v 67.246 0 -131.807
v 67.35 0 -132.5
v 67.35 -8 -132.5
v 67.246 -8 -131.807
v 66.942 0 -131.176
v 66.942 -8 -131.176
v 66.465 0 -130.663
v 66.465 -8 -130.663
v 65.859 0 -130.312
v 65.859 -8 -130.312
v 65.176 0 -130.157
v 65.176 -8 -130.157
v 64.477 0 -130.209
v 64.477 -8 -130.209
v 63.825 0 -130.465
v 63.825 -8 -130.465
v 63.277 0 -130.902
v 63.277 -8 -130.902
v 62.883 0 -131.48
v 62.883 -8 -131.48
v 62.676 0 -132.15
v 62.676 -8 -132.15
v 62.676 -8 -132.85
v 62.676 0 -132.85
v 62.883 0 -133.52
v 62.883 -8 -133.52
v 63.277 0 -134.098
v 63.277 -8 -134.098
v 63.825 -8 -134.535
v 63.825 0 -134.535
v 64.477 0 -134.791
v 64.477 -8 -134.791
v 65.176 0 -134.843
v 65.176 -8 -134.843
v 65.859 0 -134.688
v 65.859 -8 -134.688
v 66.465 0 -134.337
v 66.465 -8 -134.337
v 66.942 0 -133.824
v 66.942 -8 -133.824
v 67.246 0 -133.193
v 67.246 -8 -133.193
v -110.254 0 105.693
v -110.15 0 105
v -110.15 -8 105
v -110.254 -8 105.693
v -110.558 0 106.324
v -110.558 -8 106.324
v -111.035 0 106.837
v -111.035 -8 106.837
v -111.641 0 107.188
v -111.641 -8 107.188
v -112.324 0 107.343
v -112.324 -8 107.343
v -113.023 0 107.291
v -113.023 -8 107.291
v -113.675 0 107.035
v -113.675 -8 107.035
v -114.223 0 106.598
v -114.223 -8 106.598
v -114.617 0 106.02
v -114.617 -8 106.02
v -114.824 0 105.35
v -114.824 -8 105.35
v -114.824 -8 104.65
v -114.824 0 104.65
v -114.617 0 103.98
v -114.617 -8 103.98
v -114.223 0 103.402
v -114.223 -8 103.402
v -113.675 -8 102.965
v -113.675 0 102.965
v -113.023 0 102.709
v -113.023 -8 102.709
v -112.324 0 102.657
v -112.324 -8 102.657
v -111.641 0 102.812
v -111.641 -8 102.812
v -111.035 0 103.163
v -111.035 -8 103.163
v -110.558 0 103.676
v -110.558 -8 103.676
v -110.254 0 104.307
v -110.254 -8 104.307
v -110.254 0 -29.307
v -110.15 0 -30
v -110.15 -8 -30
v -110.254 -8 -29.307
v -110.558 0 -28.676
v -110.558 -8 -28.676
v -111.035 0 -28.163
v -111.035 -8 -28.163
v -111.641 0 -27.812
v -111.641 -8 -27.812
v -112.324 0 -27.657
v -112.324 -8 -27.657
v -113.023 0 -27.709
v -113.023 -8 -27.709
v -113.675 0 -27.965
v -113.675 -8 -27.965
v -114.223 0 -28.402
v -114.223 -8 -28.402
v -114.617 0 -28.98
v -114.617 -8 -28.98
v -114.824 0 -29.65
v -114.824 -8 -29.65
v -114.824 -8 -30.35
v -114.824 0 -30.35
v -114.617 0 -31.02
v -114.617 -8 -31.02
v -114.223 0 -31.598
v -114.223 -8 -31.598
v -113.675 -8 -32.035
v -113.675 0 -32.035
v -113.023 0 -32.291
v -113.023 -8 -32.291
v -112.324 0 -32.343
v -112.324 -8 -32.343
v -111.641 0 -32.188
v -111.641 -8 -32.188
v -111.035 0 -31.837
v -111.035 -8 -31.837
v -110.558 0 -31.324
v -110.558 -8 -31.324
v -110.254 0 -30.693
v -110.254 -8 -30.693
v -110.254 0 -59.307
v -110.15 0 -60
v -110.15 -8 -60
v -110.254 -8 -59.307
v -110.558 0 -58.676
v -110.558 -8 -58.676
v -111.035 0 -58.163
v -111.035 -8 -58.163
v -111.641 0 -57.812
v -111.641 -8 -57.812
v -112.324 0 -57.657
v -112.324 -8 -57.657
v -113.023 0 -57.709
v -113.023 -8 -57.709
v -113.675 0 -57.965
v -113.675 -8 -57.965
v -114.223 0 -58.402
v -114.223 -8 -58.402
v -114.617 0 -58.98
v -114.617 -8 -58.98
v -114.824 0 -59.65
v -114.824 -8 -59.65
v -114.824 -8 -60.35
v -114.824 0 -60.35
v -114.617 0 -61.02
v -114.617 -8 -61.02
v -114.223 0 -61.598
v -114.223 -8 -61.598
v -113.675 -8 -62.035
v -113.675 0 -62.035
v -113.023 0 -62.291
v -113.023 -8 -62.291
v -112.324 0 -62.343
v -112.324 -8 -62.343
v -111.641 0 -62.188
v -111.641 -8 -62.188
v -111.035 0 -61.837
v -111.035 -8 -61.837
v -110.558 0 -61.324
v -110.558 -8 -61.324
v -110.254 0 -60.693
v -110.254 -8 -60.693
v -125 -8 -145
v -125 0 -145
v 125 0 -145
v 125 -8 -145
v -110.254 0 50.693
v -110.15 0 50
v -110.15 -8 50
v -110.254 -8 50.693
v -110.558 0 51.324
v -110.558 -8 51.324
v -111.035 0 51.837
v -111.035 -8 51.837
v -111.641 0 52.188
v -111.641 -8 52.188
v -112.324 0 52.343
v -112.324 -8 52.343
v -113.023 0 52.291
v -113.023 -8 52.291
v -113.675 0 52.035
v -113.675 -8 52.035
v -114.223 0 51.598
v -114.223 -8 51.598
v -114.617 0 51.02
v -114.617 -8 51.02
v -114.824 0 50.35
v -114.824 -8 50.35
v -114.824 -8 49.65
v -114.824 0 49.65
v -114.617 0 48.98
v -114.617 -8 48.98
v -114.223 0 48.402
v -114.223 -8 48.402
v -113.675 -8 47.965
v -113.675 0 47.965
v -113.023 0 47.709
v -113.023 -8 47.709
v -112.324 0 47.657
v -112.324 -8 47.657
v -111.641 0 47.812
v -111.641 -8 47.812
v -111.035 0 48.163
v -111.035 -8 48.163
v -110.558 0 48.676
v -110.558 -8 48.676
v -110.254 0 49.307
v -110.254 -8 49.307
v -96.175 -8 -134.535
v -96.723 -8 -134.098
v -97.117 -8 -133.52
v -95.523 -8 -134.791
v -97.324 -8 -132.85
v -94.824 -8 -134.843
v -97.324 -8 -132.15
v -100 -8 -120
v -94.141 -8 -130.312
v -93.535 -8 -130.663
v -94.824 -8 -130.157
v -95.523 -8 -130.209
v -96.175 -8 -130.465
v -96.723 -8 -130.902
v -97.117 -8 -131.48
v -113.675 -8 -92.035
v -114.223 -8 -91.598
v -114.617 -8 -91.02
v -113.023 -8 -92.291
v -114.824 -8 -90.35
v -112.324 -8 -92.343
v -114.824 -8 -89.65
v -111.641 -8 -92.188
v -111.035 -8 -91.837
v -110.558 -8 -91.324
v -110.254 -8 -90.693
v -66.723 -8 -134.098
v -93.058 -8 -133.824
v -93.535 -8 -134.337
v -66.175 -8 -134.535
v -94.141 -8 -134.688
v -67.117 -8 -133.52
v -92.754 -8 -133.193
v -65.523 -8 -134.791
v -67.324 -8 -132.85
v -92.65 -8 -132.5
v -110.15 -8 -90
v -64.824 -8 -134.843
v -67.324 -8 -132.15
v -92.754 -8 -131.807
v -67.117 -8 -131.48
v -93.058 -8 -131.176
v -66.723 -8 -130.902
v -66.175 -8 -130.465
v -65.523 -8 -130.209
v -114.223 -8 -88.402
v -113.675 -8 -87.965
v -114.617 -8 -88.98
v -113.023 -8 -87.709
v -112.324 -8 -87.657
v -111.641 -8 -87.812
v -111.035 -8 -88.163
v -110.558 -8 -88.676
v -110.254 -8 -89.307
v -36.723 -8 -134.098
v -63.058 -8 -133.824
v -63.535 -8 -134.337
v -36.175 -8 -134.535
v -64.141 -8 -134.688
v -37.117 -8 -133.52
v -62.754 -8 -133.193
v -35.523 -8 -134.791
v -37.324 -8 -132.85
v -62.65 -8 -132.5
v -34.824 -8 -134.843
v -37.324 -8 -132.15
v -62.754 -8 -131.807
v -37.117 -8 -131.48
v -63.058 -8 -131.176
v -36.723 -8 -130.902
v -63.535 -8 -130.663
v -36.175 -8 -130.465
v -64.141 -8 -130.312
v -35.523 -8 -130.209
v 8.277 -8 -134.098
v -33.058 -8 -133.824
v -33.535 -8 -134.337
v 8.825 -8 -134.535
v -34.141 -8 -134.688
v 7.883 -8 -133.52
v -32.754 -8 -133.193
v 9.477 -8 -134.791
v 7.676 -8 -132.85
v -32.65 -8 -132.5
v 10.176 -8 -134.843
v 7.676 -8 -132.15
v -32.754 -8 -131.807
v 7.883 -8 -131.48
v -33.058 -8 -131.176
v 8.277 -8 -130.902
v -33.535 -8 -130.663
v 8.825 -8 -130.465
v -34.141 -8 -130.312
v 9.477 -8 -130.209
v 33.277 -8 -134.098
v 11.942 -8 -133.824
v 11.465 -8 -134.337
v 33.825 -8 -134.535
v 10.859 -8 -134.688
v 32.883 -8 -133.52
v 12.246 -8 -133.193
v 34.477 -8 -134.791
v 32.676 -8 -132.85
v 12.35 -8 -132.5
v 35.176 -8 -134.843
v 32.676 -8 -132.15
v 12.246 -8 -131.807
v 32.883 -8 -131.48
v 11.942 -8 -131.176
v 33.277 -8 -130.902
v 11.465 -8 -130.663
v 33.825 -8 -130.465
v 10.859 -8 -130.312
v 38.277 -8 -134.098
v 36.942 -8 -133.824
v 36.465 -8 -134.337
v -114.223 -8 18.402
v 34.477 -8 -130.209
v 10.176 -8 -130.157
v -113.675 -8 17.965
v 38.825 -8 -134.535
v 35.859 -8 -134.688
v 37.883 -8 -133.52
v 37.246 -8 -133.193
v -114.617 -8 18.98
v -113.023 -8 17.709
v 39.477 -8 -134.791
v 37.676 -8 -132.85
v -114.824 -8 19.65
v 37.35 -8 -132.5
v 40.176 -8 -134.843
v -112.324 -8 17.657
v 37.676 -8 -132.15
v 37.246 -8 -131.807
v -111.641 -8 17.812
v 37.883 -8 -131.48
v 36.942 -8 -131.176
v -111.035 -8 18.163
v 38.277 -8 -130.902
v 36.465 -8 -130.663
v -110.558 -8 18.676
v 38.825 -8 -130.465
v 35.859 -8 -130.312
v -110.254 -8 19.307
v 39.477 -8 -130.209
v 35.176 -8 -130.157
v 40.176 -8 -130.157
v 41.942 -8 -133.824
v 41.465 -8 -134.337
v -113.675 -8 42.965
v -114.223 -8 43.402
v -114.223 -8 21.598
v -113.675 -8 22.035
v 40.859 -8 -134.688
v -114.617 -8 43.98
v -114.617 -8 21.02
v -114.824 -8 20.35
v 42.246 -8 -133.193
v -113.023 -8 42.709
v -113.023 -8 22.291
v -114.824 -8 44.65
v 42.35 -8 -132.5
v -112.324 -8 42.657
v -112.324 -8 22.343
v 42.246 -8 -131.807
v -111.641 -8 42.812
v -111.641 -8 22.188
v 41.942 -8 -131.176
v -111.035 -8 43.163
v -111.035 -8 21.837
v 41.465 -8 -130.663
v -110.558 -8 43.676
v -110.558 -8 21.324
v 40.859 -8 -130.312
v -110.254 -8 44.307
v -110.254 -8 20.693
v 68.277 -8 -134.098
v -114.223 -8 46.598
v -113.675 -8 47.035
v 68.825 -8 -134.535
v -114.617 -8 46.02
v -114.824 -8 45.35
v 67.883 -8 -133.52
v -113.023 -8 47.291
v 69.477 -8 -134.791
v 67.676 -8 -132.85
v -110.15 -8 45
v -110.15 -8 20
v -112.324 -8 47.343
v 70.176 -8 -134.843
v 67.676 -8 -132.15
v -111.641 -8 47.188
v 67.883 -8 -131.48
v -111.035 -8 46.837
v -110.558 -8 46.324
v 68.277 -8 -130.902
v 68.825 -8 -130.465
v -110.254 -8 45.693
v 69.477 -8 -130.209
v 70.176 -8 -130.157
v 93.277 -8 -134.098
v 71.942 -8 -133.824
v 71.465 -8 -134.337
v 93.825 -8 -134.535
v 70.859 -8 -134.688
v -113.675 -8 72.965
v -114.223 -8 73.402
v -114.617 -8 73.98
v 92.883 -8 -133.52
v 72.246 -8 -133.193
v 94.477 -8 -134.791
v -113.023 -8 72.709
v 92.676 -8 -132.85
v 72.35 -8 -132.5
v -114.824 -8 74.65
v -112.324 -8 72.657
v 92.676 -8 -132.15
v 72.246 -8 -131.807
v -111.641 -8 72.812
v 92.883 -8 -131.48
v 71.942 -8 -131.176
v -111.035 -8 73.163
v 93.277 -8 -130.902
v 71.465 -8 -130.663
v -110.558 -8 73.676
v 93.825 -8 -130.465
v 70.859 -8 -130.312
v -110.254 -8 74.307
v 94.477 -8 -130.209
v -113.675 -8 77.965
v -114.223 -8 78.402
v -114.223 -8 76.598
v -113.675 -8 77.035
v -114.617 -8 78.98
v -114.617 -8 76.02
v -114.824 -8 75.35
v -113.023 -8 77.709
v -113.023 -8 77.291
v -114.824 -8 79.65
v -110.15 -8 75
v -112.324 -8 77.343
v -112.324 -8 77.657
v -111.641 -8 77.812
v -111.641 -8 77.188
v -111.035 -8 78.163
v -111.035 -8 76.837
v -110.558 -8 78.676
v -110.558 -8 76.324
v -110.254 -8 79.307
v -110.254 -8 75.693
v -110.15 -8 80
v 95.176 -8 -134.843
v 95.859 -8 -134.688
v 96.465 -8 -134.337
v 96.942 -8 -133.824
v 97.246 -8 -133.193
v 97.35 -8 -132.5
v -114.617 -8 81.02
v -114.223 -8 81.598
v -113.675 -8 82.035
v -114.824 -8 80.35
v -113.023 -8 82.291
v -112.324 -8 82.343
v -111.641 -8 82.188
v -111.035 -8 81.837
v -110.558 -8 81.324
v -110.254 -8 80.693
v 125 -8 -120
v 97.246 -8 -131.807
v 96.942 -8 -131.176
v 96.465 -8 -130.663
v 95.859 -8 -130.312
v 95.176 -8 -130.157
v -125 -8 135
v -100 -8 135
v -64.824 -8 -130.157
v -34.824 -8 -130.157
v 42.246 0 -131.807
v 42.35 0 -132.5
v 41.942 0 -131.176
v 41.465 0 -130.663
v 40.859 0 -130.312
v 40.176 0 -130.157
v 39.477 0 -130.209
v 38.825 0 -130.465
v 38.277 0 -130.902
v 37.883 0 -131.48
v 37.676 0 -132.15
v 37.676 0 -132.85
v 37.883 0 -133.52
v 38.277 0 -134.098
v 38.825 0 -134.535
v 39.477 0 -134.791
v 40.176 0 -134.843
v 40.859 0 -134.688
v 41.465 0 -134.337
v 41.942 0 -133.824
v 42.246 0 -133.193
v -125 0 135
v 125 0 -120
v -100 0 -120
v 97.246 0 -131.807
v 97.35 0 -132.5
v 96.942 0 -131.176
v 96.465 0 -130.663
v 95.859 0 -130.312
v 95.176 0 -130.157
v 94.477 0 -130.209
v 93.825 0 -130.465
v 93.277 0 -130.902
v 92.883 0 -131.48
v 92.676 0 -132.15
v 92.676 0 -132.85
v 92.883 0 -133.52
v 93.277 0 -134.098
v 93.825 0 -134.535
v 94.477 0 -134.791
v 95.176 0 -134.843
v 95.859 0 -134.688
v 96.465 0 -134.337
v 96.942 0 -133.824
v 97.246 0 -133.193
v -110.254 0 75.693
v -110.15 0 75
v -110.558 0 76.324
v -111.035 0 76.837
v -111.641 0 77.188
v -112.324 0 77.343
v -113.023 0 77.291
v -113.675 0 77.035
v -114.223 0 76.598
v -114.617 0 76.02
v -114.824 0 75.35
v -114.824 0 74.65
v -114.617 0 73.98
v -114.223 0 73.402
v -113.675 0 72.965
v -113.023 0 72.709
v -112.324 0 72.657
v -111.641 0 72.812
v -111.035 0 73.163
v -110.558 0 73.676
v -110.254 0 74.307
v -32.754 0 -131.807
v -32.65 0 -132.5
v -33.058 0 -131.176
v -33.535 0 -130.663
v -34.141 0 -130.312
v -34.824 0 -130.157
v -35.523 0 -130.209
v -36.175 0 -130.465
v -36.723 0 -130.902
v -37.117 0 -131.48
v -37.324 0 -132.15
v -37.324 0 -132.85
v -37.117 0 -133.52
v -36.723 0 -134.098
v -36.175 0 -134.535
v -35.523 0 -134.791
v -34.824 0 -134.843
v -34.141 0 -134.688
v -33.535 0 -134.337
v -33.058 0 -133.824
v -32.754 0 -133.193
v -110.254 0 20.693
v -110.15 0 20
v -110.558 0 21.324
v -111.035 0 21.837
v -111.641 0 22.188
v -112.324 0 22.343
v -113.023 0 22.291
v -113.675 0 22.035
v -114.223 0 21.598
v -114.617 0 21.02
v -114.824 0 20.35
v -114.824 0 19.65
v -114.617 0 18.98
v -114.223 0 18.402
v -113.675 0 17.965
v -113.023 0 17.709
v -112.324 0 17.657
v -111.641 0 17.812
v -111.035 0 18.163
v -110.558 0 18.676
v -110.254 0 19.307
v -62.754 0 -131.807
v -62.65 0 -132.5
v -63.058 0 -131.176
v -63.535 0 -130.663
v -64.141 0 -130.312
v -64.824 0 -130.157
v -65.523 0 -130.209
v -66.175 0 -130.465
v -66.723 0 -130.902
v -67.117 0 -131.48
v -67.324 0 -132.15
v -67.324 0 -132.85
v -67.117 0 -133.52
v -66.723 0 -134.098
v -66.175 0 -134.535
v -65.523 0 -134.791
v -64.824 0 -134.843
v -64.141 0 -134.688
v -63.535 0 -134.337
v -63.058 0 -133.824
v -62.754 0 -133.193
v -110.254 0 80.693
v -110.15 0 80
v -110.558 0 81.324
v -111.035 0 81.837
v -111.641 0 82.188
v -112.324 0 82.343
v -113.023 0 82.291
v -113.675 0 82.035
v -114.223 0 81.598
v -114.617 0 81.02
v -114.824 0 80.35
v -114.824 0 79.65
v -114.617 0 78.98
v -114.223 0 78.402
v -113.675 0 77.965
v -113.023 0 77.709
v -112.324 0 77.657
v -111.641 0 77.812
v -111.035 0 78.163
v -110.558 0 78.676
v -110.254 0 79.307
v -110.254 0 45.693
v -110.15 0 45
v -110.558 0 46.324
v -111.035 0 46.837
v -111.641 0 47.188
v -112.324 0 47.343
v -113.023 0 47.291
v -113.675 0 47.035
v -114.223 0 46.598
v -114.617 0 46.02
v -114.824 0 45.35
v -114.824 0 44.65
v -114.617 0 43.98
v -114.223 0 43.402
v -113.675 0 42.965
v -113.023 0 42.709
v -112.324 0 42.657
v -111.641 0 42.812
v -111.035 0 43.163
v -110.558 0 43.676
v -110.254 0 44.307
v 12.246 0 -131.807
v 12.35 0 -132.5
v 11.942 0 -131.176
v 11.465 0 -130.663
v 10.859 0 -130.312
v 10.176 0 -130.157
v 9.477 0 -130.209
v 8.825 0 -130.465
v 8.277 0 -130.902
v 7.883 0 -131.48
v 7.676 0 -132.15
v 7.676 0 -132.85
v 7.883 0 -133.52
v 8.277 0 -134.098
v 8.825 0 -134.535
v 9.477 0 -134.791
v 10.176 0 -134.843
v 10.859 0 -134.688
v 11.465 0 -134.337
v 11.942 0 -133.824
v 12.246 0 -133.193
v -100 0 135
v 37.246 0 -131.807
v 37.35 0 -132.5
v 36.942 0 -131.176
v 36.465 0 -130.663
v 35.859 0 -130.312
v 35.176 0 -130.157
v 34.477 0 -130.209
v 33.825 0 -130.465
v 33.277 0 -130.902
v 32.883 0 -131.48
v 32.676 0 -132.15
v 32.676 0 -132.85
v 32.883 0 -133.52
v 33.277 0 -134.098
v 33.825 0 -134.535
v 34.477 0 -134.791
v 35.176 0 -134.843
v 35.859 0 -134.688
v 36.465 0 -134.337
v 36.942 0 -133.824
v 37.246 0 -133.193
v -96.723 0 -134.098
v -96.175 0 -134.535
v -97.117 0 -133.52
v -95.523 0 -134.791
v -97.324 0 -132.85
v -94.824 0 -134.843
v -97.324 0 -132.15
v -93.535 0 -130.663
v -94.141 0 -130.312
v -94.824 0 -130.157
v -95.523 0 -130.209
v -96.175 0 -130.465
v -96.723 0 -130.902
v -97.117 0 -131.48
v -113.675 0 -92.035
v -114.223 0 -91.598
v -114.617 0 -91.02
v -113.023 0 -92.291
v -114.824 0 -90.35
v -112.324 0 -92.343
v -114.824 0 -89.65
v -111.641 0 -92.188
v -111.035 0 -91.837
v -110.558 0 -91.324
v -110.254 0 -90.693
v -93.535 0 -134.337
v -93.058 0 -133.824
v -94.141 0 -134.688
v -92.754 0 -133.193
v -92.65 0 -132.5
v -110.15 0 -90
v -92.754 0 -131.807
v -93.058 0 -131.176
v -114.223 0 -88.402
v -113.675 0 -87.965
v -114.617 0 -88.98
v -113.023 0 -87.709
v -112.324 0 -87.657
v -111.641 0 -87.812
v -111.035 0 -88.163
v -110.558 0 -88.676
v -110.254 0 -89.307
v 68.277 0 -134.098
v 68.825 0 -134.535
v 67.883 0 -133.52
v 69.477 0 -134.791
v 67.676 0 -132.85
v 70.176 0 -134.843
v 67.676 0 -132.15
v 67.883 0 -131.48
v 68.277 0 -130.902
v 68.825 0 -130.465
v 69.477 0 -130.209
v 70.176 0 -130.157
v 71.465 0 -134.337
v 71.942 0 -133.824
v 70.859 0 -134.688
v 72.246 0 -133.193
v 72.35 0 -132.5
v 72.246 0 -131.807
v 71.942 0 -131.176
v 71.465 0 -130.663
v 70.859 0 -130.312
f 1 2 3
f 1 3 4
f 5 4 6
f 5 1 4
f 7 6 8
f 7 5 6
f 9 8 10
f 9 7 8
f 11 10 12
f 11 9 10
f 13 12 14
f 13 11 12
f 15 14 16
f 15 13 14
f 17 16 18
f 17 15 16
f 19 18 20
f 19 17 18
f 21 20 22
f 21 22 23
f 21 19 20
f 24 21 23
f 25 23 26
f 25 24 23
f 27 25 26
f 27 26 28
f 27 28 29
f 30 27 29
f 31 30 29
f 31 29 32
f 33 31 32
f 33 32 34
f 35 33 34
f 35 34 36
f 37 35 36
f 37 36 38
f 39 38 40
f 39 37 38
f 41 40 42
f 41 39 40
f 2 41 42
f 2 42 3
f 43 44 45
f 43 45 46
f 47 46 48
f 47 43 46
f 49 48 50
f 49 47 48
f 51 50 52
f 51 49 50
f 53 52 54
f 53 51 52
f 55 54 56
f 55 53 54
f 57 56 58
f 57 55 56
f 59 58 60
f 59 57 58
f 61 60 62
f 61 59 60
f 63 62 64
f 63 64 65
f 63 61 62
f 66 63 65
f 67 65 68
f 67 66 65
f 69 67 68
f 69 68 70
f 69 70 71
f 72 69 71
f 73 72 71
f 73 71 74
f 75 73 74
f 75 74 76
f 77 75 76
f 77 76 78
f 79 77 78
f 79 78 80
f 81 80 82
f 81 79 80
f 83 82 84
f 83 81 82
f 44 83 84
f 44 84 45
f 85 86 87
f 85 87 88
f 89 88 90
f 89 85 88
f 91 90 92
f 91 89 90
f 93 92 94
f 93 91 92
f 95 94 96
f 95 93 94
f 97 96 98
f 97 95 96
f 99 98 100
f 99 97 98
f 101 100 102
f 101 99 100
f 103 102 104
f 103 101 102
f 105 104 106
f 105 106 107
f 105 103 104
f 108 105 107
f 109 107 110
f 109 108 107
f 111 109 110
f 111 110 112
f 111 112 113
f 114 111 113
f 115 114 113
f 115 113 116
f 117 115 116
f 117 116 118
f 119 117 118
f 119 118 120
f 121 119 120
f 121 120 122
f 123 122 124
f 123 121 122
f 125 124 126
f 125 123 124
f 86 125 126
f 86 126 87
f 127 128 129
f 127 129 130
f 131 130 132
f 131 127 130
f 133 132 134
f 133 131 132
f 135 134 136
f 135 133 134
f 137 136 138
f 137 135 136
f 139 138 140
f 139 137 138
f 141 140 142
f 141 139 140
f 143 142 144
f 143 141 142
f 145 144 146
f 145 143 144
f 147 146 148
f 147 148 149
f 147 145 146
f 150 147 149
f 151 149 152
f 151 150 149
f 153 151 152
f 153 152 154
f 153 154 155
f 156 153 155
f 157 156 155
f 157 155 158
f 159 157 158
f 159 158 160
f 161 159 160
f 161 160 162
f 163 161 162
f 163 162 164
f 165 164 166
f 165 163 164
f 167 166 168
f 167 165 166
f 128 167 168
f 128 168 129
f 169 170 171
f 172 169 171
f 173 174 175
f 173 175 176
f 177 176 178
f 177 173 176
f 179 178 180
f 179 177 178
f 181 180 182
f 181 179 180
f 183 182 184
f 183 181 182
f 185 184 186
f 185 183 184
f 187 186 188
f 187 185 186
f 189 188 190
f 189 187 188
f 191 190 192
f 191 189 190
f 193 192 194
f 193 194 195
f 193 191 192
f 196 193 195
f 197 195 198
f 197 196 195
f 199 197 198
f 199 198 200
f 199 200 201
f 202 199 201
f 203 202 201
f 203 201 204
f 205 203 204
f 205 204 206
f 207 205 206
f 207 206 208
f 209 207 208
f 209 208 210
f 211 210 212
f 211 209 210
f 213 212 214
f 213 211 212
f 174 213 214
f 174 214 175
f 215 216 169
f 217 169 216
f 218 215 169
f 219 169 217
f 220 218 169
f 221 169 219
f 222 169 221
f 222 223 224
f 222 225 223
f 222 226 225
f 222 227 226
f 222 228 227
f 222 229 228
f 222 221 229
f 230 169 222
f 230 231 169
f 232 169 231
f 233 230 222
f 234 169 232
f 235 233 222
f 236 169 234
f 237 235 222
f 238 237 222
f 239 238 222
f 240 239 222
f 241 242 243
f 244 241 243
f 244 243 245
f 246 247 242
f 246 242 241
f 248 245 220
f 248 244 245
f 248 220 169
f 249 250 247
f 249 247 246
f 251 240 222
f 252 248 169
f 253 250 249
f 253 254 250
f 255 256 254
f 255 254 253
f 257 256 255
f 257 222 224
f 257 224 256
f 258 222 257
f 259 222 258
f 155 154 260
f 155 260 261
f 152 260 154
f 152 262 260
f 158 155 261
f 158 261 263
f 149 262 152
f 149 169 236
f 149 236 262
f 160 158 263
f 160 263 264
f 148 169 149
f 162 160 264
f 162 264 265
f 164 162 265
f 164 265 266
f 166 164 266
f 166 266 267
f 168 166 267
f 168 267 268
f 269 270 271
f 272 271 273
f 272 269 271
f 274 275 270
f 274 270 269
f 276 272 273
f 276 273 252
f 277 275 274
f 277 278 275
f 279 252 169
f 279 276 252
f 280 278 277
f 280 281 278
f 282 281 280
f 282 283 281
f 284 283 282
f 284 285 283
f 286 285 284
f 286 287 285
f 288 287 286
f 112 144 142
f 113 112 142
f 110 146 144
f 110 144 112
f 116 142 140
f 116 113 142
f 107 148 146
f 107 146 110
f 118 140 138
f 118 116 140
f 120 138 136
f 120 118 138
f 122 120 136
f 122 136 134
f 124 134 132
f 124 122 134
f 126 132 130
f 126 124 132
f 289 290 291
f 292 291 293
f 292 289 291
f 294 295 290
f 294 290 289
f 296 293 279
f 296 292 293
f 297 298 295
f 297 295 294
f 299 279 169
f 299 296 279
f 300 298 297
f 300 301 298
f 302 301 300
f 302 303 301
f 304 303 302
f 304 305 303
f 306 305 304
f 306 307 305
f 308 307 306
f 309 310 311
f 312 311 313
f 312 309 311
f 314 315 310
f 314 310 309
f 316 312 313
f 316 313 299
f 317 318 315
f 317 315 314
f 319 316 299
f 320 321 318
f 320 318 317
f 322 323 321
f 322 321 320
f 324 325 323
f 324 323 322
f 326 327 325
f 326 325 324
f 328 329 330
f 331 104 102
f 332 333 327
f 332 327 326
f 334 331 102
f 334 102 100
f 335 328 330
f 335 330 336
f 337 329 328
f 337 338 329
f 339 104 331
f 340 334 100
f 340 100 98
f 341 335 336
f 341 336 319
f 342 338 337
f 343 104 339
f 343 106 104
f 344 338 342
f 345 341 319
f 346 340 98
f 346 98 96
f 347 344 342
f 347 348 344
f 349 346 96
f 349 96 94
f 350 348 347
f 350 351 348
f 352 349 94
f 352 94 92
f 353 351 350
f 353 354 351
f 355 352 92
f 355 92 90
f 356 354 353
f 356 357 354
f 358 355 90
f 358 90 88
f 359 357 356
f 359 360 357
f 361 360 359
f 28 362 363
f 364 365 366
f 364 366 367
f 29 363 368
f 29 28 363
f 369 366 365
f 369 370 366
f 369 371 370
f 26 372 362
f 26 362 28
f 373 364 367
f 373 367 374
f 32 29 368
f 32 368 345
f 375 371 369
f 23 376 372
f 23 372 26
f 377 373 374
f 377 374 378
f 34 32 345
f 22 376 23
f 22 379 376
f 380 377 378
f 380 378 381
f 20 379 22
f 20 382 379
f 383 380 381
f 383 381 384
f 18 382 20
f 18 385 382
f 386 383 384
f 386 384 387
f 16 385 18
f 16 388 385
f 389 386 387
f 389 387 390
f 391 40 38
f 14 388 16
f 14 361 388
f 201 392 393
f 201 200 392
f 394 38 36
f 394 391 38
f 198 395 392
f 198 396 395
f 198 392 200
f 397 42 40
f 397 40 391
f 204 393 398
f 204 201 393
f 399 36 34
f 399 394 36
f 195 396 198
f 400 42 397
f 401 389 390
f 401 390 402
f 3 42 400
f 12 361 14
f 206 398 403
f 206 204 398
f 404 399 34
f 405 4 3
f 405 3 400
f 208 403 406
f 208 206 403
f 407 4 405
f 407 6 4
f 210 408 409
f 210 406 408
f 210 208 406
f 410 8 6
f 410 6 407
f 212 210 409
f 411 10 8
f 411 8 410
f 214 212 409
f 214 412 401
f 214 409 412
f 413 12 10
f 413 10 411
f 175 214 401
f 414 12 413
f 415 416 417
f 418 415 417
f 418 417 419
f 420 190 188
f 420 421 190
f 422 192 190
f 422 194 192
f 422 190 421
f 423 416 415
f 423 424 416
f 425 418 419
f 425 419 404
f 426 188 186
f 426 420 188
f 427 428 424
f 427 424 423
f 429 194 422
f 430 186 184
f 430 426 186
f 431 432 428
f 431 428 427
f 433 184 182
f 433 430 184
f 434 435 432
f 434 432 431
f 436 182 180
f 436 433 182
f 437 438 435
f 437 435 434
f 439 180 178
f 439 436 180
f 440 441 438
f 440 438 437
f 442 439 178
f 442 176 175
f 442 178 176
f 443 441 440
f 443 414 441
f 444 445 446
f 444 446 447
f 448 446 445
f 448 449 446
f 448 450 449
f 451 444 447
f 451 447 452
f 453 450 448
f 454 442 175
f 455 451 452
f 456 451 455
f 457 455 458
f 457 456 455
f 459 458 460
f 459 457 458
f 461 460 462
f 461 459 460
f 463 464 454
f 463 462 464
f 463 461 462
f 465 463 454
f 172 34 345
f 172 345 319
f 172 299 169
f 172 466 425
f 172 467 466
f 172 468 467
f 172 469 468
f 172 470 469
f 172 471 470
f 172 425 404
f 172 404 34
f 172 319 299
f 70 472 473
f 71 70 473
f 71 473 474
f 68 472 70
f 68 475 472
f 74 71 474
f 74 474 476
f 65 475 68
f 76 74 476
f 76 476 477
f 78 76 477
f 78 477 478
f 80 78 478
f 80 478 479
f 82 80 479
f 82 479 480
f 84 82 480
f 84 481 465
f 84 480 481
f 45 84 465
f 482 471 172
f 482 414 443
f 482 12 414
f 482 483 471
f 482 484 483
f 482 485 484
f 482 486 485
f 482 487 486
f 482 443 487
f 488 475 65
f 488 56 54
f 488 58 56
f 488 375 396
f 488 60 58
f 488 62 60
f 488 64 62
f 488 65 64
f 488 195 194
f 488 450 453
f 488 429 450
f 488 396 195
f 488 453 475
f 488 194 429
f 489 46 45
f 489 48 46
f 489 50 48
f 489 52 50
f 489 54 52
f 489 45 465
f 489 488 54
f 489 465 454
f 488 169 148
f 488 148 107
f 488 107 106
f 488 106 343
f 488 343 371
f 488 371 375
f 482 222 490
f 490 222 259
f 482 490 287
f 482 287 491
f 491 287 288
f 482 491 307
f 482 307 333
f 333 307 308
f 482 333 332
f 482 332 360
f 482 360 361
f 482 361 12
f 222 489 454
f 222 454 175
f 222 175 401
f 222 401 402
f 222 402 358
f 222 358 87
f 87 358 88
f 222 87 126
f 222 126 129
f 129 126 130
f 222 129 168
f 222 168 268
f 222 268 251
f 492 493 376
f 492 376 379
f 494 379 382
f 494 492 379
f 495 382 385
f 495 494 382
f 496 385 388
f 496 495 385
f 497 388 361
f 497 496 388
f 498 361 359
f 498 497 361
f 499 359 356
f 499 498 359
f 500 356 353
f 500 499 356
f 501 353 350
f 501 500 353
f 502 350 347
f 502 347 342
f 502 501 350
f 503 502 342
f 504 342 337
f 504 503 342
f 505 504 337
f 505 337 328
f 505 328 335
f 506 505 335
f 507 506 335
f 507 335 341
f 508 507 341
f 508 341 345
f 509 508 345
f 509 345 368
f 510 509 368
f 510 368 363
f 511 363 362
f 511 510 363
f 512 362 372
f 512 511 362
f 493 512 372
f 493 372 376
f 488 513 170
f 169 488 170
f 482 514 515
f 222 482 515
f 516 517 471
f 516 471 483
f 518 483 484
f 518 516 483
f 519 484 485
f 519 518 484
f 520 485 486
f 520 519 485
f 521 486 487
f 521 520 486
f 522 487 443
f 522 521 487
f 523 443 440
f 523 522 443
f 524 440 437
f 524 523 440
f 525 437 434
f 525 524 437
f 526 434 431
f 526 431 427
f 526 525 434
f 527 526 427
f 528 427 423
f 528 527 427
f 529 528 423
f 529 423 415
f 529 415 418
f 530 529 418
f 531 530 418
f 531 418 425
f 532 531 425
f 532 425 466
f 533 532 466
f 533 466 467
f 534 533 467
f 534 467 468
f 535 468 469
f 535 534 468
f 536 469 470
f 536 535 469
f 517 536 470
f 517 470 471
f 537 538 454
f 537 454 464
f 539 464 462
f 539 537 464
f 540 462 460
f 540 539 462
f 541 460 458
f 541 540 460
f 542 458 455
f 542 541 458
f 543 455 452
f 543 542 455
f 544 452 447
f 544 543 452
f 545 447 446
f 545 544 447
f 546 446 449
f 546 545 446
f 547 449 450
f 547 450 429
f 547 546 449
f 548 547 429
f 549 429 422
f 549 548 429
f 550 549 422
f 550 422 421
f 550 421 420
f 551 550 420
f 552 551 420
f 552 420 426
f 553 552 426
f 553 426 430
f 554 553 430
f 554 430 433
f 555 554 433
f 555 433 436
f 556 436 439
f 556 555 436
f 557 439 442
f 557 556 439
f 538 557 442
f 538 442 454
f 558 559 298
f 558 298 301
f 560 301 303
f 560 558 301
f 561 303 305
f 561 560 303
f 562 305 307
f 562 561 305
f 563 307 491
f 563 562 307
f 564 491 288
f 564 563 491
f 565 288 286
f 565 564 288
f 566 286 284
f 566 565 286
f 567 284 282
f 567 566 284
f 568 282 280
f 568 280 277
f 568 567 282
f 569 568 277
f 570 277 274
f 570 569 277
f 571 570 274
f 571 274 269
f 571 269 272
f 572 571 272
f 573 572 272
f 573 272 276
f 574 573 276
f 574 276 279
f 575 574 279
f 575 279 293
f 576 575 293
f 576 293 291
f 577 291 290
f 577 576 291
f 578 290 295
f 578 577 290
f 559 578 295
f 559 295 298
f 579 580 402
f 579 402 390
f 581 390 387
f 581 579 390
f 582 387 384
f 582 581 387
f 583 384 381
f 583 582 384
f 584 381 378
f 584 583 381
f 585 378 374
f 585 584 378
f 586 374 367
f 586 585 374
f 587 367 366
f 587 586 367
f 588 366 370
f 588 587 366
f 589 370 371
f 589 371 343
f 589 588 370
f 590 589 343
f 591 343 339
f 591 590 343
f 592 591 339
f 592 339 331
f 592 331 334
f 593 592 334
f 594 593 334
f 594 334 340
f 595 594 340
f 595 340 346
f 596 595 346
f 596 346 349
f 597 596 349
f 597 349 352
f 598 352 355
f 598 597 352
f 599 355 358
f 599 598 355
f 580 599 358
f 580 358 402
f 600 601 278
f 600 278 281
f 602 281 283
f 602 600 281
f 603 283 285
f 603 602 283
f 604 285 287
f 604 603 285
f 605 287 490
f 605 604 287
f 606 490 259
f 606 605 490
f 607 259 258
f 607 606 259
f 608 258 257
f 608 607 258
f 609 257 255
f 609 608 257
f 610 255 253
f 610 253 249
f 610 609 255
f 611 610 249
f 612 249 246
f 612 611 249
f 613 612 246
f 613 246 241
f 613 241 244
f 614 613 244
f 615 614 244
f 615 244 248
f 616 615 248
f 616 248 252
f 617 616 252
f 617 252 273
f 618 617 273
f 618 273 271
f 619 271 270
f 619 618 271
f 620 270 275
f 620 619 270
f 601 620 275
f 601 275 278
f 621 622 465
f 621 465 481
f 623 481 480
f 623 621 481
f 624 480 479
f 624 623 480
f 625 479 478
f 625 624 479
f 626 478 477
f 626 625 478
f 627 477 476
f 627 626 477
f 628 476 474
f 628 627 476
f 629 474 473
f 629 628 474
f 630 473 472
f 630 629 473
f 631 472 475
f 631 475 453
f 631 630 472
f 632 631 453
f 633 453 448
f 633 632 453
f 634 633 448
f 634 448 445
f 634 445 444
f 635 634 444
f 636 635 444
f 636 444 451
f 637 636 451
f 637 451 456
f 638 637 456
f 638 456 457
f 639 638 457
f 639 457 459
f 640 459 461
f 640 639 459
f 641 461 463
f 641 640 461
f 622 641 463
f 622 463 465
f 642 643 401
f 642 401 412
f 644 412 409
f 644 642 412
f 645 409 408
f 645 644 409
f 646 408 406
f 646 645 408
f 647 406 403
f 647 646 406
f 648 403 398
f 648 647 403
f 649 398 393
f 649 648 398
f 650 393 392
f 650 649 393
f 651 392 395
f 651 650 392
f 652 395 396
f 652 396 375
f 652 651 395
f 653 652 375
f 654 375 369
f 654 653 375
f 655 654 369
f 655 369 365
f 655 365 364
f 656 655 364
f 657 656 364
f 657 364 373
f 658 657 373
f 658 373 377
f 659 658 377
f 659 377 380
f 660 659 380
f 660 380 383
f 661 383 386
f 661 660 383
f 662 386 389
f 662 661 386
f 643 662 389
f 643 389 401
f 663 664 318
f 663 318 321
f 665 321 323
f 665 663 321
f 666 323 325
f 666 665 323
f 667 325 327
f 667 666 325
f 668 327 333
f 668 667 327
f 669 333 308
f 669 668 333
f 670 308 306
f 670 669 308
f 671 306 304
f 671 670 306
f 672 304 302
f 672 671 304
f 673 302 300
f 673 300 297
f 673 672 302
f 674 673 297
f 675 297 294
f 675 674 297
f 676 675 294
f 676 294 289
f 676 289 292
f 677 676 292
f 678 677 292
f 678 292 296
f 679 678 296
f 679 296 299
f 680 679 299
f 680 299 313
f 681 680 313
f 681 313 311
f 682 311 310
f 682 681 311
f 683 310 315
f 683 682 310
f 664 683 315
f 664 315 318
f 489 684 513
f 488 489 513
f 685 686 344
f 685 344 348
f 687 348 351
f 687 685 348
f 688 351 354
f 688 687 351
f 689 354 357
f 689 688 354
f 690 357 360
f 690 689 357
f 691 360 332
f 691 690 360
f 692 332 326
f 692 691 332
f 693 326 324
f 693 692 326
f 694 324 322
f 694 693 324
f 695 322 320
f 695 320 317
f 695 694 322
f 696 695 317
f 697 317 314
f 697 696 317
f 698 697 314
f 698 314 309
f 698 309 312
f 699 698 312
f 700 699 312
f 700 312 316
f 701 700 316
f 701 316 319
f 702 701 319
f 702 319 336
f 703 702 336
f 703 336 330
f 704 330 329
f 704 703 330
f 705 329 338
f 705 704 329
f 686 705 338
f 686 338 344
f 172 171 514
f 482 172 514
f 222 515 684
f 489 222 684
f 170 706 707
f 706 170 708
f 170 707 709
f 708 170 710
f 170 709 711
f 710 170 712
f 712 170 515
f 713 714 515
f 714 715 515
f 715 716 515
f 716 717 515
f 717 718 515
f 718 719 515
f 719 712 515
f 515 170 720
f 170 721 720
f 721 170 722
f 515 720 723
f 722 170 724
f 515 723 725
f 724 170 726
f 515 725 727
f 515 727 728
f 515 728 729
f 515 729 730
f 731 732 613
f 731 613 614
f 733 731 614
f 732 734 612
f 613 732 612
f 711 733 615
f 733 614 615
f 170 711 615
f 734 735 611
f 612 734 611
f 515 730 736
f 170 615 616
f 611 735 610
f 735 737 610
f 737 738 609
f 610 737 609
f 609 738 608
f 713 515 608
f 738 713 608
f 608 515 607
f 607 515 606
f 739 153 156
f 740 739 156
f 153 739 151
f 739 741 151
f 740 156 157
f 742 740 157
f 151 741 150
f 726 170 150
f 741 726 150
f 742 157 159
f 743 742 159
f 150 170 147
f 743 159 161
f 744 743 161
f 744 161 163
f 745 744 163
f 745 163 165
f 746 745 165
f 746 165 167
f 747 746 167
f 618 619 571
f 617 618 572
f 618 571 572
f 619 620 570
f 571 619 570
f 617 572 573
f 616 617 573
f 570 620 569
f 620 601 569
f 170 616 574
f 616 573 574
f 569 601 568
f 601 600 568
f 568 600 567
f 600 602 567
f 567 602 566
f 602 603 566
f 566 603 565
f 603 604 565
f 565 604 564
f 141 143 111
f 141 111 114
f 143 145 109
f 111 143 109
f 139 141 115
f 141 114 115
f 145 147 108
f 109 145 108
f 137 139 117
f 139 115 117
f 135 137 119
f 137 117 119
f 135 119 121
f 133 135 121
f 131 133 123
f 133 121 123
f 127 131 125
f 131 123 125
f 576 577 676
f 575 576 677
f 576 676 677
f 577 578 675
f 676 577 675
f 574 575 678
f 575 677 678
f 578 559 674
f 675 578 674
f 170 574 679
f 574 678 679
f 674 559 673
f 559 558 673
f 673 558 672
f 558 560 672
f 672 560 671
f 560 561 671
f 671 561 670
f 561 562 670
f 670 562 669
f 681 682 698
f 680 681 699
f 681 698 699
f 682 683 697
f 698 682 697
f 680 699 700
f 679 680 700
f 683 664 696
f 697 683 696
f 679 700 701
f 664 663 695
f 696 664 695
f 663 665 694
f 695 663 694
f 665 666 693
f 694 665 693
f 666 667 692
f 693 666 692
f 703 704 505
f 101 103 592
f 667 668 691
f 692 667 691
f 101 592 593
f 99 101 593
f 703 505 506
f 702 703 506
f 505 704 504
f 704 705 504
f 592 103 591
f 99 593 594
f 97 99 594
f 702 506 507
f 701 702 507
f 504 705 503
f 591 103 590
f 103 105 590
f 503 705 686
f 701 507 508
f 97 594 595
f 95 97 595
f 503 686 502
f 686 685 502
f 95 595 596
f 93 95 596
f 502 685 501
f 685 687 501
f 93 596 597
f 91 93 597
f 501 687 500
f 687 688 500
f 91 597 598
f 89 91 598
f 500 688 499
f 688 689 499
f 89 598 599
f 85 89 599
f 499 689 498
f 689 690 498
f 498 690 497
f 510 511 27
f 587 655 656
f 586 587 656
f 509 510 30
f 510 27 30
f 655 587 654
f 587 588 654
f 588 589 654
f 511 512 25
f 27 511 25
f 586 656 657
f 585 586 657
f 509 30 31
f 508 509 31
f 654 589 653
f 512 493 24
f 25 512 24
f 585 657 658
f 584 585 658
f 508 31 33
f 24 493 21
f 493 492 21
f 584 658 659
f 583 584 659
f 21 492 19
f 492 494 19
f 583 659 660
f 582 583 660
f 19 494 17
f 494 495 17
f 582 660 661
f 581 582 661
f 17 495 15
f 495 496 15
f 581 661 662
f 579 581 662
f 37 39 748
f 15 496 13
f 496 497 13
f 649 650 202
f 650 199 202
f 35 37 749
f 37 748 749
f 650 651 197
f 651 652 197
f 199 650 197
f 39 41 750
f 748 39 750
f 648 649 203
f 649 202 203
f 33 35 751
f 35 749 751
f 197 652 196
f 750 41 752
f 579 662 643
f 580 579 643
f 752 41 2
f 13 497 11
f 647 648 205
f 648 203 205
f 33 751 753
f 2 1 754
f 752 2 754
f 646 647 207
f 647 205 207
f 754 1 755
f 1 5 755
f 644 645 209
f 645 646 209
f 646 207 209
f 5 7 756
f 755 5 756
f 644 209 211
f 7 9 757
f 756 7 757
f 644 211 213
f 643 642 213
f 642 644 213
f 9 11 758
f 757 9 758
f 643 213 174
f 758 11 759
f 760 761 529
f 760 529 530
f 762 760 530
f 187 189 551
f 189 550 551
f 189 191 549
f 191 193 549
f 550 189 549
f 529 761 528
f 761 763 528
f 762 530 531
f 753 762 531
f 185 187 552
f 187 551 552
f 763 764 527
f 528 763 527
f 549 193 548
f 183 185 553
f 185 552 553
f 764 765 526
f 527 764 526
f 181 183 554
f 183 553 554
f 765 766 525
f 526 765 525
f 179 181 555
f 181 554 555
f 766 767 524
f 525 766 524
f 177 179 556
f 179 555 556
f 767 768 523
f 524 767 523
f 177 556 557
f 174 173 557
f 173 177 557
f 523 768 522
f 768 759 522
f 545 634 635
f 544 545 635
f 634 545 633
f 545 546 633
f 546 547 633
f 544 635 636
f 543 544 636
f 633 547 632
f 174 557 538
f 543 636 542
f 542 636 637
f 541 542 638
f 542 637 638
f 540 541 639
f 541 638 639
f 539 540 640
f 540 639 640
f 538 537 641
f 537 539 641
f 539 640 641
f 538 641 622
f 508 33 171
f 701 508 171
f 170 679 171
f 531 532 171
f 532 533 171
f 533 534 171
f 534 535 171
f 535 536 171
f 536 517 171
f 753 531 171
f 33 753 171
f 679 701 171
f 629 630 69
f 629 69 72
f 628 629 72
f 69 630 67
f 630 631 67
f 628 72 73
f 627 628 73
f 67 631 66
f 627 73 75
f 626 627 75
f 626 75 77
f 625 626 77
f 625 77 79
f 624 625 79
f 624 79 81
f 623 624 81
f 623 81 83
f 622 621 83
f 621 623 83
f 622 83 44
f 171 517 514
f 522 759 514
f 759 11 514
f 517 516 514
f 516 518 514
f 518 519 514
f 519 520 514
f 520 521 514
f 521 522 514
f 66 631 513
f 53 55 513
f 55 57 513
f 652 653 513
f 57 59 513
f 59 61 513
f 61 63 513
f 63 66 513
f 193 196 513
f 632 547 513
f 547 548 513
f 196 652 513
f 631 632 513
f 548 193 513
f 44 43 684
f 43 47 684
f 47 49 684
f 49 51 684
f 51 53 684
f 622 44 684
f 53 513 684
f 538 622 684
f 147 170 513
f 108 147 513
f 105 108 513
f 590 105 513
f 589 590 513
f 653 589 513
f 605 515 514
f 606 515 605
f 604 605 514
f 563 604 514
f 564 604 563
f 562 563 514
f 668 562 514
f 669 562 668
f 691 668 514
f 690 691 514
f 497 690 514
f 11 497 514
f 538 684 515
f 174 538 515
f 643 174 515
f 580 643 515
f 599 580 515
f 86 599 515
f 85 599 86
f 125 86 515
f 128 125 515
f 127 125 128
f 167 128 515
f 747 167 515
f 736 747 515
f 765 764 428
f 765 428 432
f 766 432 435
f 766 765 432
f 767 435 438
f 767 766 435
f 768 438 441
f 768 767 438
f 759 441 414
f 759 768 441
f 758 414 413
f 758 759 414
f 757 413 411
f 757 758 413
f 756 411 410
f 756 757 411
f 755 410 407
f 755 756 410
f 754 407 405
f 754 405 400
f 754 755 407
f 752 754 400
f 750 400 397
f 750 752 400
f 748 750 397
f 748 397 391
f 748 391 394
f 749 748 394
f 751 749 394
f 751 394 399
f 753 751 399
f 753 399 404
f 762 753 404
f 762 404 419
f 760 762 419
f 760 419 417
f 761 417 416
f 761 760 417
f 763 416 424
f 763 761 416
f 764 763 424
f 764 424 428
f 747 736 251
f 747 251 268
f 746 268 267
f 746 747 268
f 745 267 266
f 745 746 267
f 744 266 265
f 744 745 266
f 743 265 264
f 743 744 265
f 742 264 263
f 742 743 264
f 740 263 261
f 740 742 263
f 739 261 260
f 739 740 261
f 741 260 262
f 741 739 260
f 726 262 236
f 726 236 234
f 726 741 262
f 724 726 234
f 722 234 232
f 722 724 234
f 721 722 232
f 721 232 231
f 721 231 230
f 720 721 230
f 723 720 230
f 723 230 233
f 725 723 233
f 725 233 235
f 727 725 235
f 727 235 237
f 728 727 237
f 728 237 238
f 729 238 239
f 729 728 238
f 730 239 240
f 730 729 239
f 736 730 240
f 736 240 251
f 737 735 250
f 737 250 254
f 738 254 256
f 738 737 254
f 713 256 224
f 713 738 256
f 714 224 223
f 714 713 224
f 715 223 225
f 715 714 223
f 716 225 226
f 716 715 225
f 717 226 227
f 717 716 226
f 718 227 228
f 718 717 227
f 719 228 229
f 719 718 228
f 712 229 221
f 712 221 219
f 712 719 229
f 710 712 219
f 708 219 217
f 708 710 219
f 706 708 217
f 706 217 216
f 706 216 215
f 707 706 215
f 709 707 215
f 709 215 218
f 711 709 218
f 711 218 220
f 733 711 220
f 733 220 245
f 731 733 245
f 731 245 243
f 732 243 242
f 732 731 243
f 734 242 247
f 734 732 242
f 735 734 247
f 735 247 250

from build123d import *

# Parameters (mm, degrees)
F0_R     = 2.35
F1_DEPTH = 8


with BuildPart() as f1:
    # F0 (on Front) → F1 (new body)
    with BuildSketch(Plane.XZ):
        Polygon((-125, 135), (-125, -145), (125, -145), (125, -120), (-100, -120), (-100, 135), align=None)
        with Locations((-95, -132.5)):
            Circle(F0_R, mode=Mode.SUBTRACT)
        with Locations((-65, -132.5)):
            Circle(F0_R, mode=Mode.SUBTRACT)
        with Locations((-112.5, -90)):
            Circle(F0_R, mode=Mode.SUBTRACT)
        with Locations((-35, -132.5)):
            Circle(F0_R, mode=Mode.SUBTRACT)
        with Locations((-112.5, -60)):
            Circle(F0_R, mode=Mode.SUBTRACT)
        with Locations((-112.5, -30)):
            Circle(F0_R, mode=Mode.SUBTRACT)
        with Locations((10, -132.5)):
            Circle(F0_R, mode=Mode.SUBTRACT)
        with Locations((35, -132.5)):
            Circle(F0_R, mode=Mode.SUBTRACT)
        with Locations((40, -132.5)):
            Circle(F0_R, mode=Mode.SUBTRACT)
        with Locations((65, -132.5)):
            Circle(F0_R, mode=Mode.SUBTRACT)
        with Locations((70, -132.5)):
            Circle(F0_R, mode=Mode.SUBTRACT)
        with Locations((95, -132.5)):
            Circle(F0_R, mode=Mode.SUBTRACT)
        with Locations((-112.5, 20)):
            Circle(F0_R, mode=Mode.SUBTRACT)
        with Locations((-112.5, 45)):
            Circle(F0_R, mode=Mode.SUBTRACT)
        with Locations((-112.5, 50)):
            Circle(F0_R, mode=Mode.SUBTRACT)
        with Locations((-112.5, 75)):
            Circle(F0_R, mode=Mode.SUBTRACT)
        with Locations((-112.5, 80)):
            Circle(F0_R, mode=Mode.SUBTRACT)
        with Locations((-112.5, 105)):
            Circle(F0_R, mode=Mode.SUBTRACT)
    extrude(amount=F1_DEPTH)


solid = f1.part
